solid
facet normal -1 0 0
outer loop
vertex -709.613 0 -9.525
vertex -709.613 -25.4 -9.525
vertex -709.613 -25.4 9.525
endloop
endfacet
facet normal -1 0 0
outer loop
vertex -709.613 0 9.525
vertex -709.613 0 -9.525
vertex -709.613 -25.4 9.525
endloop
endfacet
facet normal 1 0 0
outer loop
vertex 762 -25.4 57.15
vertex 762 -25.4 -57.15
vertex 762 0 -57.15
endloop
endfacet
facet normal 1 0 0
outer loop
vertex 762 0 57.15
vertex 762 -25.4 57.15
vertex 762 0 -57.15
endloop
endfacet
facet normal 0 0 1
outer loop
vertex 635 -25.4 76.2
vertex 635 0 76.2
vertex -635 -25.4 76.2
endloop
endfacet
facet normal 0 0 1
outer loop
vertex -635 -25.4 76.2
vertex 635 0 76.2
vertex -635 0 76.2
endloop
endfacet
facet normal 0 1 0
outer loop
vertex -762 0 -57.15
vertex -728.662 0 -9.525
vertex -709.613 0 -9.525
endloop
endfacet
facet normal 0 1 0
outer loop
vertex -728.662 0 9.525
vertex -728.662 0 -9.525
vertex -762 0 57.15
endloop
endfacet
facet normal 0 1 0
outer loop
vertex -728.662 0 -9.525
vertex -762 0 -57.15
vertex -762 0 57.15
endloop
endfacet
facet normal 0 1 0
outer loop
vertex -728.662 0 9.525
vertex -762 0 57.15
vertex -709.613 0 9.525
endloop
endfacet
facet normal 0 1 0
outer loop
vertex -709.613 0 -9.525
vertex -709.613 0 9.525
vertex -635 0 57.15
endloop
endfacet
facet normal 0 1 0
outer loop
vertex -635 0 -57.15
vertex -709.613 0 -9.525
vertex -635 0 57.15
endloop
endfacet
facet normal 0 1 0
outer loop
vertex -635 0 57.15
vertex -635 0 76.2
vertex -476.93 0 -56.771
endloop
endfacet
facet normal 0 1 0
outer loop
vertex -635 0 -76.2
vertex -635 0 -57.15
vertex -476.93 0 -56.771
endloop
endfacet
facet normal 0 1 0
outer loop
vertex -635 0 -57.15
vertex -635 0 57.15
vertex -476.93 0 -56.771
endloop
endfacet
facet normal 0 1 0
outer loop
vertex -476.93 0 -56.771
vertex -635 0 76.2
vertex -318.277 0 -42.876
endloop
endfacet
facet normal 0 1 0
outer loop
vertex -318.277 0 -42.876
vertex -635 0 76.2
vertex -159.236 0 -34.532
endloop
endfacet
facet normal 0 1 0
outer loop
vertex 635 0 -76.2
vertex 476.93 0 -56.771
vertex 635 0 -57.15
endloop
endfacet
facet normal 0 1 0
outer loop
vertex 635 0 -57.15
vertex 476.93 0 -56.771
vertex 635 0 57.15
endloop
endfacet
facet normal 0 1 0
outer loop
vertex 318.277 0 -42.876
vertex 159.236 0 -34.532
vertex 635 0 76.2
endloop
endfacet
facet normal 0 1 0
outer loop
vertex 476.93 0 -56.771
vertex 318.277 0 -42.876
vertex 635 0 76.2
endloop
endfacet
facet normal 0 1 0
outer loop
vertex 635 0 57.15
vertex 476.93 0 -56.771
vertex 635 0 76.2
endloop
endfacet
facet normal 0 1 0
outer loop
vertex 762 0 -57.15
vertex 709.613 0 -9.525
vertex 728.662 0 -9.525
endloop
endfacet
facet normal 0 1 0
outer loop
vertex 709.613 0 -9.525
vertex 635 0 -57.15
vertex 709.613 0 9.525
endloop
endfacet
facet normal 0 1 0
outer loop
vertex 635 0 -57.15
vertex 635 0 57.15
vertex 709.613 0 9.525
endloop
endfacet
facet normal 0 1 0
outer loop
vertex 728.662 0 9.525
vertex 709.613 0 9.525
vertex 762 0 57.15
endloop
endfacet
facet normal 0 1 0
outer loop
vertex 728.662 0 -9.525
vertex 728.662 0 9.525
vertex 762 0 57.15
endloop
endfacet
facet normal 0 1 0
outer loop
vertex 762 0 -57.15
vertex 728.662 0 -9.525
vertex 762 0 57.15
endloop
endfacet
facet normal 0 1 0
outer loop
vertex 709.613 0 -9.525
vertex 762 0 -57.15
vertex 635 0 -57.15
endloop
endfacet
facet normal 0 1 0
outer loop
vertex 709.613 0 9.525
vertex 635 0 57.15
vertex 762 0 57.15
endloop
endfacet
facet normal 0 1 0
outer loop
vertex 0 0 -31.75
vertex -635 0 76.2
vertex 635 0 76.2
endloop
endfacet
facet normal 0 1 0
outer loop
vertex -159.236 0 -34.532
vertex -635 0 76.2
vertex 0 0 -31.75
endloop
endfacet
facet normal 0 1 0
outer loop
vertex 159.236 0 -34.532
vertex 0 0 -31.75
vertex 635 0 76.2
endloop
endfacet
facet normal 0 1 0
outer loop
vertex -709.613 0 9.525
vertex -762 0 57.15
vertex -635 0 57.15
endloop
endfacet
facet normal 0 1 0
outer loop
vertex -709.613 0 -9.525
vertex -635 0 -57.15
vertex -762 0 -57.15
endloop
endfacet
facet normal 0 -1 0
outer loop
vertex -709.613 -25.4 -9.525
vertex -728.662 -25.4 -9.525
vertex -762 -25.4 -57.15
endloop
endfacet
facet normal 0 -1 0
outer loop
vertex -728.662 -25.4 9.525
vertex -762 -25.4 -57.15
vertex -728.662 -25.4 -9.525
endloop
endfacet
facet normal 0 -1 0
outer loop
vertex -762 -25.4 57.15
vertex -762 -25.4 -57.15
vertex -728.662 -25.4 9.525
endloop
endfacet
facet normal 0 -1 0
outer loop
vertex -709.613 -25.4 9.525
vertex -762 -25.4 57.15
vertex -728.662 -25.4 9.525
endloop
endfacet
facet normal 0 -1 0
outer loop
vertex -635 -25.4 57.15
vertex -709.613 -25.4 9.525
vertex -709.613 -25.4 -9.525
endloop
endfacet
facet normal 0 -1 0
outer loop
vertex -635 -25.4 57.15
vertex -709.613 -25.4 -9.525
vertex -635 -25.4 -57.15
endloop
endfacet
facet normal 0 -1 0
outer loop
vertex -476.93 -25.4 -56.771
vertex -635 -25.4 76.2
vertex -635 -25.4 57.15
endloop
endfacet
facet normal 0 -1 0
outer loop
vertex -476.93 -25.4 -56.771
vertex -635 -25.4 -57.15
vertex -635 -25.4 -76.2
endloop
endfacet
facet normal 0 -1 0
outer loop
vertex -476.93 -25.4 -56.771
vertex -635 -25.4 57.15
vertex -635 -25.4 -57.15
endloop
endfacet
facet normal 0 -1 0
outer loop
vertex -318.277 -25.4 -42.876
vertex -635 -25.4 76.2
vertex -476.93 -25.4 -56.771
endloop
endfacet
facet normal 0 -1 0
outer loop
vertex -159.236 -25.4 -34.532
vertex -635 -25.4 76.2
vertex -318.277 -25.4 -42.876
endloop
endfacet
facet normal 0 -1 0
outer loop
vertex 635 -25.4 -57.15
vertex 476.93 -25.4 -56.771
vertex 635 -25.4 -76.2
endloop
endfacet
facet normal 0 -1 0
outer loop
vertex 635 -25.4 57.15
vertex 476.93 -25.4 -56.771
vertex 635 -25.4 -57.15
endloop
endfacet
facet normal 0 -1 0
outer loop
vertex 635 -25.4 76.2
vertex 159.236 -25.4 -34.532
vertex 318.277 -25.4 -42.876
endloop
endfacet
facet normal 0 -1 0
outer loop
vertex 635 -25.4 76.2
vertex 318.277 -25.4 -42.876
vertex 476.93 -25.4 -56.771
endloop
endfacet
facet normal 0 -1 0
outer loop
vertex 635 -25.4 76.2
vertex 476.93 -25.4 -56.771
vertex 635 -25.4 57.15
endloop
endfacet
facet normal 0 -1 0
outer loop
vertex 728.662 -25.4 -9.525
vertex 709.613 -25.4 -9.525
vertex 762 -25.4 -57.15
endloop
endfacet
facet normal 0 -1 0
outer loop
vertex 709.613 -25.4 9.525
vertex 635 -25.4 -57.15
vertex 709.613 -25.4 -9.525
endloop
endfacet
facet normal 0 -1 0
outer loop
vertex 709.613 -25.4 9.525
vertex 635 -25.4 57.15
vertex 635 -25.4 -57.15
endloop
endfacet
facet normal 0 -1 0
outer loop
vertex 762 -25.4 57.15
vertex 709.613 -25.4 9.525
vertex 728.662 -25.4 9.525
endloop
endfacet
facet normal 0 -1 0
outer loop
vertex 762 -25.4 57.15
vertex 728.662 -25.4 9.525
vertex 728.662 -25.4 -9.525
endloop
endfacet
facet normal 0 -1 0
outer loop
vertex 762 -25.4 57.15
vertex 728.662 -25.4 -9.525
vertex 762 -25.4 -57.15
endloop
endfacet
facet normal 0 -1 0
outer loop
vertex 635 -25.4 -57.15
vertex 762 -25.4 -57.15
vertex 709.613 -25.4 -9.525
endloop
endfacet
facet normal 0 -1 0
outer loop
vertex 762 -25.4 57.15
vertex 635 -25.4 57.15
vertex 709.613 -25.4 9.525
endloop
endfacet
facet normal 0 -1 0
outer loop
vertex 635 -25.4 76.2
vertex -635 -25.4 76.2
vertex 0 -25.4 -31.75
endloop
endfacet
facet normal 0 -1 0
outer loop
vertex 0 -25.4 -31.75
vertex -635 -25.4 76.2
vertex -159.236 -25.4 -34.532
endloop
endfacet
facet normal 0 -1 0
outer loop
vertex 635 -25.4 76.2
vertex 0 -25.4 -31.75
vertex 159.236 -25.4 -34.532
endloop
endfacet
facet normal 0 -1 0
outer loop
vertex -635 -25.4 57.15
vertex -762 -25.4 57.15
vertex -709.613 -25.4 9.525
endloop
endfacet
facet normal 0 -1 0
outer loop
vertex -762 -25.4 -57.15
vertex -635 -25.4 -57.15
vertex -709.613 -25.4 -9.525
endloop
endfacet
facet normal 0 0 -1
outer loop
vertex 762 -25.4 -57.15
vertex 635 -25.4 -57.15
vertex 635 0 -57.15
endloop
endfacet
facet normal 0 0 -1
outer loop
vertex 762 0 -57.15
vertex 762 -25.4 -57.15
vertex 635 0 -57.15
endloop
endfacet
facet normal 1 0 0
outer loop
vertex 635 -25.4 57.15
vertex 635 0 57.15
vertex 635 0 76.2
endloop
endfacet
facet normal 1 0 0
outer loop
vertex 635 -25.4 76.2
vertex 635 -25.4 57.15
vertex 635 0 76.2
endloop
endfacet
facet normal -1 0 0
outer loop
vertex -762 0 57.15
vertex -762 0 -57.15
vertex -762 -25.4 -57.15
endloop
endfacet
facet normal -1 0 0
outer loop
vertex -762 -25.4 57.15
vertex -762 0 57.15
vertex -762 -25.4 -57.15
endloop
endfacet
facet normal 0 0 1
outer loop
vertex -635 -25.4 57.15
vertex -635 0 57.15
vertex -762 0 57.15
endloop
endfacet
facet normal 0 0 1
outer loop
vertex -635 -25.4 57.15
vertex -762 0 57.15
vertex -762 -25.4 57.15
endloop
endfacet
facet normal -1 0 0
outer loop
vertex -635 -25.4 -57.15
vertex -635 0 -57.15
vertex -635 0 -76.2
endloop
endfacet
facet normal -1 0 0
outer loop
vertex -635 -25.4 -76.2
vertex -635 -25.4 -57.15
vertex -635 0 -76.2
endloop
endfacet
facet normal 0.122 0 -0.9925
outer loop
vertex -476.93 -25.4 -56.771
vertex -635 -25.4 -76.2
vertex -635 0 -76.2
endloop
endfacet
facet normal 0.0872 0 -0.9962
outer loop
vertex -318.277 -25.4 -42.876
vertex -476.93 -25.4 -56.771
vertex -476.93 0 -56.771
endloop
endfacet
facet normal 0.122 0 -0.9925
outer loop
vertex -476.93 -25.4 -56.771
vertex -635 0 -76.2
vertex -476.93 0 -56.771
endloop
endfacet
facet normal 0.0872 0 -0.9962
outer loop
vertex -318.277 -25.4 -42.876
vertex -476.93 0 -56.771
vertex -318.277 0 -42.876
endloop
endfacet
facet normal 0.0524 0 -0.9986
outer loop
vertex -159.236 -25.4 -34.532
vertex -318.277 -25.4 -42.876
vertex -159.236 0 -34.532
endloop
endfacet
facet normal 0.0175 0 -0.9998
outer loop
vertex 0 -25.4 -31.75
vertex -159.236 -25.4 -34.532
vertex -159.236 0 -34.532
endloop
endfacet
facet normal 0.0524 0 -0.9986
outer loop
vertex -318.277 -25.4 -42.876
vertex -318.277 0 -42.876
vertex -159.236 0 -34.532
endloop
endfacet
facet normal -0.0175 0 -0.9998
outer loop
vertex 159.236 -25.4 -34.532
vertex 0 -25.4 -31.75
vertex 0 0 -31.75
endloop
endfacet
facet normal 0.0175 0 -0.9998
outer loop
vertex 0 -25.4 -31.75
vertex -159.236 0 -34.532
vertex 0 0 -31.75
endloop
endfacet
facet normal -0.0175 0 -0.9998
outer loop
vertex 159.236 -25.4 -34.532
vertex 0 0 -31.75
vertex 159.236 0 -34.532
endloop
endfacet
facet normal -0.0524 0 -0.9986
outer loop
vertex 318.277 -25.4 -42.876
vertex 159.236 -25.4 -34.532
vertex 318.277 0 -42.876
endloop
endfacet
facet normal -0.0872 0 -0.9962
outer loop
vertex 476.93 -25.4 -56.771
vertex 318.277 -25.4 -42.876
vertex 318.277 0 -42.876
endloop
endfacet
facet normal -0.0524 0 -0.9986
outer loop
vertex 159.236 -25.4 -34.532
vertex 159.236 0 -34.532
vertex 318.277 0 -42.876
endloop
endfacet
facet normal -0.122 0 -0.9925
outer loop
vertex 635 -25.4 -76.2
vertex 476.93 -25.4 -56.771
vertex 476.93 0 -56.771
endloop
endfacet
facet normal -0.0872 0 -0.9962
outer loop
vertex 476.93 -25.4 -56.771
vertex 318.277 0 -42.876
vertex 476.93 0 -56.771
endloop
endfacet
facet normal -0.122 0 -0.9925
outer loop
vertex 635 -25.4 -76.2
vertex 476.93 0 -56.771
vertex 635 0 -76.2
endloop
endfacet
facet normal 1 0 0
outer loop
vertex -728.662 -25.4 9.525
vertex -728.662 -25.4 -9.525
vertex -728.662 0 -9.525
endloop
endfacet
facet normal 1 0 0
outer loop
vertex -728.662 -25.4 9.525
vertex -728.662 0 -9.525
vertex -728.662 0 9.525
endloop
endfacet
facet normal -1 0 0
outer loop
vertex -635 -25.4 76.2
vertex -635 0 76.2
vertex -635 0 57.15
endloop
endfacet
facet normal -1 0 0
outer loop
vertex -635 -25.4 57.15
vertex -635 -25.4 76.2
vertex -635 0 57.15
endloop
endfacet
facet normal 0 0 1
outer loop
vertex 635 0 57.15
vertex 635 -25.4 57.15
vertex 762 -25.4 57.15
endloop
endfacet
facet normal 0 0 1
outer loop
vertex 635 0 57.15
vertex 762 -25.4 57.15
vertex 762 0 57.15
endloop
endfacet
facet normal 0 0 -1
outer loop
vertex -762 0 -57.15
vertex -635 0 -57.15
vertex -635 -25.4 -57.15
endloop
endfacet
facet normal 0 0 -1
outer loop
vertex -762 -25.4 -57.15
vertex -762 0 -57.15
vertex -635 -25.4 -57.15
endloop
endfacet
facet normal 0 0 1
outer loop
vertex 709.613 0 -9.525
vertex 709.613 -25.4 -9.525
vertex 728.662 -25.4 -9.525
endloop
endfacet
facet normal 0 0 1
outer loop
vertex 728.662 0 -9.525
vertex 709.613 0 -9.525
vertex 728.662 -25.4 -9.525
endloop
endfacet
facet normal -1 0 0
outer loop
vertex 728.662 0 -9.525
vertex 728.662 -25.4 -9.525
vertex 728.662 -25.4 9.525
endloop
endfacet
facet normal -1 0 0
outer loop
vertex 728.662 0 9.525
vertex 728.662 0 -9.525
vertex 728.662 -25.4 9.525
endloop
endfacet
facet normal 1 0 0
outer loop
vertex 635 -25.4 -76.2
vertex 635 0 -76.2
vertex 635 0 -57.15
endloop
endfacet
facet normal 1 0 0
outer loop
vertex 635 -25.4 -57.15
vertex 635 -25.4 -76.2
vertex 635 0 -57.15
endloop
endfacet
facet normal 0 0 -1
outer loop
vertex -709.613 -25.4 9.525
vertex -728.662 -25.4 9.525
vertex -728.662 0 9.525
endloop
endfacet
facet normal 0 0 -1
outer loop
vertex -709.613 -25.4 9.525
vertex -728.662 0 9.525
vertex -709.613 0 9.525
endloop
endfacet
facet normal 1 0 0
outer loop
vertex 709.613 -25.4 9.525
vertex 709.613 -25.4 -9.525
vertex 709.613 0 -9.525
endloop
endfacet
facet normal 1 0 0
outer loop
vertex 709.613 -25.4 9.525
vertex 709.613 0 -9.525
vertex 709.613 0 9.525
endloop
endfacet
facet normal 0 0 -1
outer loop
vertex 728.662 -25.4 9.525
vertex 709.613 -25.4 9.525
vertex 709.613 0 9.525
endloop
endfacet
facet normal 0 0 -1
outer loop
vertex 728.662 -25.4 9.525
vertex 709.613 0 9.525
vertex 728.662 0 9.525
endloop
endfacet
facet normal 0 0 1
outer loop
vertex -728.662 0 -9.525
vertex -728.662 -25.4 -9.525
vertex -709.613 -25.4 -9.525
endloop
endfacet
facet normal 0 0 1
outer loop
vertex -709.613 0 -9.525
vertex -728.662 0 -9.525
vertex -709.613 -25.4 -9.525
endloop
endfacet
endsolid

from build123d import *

# Parameters (mm, degrees)
F1_DEPTH = 25.4
F2_W     = 25.4
F2_H     = 114.3
F3_DEPTH = 127
F4_W     = 25.4
F4_H     = 114.3
F5_DEPTH = 127
F6_W     = 19.05
F6_H     = 19.05
F7_DEPTH = 25.401


with BuildPart() as f1:
    # F0 (on Front) → F1 (new body)
    with BuildSketch(Plane.XZ):
        with BuildLine():
            Line((635, -76.2), (635, 76.2))
            Line((635, 76.2), (-635, 76.2))
            Line((-635, 76.2), (-635, -76.2))
            ThreePointArc((-635, -76.2), (0, -31.75), (635, -76.2))
        make_face()
    extrude(amount=F1_DEPTH)

    # F2 (on face) → F3 (join)
    with BuildSketch(Plane(origin=(-635, 0, 0), x_dir=(0, -1, 0), z_dir=(-1, 0, 0))):
        with Locations((12.7, 0)):
            Rectangle(F2_W, F2_H)
    extrude(amount=F3_DEPTH)

    # F4 (on face) → F5 (join)
    with BuildSketch(Plane.YZ.offset(635)):
        with Locations((-12.7, 0)):
            Rectangle(F4_W, F4_H)
    extrude(amount=F5_DEPTH)

    # F6 (on face) → F7 (cut, through all)
    with BuildSketch(Plane.XZ.offset(25.4)):
        with Locations((-719.1375, 0)):
            Rectangle(F6_W, F6_H)
        with Locations((719.1375, 0)):
            Rectangle(F6_W, F6_H)
    extrude(amount=-F7_DEPTH, mode=Mode.SUBTRACT)


solid = f1.part
